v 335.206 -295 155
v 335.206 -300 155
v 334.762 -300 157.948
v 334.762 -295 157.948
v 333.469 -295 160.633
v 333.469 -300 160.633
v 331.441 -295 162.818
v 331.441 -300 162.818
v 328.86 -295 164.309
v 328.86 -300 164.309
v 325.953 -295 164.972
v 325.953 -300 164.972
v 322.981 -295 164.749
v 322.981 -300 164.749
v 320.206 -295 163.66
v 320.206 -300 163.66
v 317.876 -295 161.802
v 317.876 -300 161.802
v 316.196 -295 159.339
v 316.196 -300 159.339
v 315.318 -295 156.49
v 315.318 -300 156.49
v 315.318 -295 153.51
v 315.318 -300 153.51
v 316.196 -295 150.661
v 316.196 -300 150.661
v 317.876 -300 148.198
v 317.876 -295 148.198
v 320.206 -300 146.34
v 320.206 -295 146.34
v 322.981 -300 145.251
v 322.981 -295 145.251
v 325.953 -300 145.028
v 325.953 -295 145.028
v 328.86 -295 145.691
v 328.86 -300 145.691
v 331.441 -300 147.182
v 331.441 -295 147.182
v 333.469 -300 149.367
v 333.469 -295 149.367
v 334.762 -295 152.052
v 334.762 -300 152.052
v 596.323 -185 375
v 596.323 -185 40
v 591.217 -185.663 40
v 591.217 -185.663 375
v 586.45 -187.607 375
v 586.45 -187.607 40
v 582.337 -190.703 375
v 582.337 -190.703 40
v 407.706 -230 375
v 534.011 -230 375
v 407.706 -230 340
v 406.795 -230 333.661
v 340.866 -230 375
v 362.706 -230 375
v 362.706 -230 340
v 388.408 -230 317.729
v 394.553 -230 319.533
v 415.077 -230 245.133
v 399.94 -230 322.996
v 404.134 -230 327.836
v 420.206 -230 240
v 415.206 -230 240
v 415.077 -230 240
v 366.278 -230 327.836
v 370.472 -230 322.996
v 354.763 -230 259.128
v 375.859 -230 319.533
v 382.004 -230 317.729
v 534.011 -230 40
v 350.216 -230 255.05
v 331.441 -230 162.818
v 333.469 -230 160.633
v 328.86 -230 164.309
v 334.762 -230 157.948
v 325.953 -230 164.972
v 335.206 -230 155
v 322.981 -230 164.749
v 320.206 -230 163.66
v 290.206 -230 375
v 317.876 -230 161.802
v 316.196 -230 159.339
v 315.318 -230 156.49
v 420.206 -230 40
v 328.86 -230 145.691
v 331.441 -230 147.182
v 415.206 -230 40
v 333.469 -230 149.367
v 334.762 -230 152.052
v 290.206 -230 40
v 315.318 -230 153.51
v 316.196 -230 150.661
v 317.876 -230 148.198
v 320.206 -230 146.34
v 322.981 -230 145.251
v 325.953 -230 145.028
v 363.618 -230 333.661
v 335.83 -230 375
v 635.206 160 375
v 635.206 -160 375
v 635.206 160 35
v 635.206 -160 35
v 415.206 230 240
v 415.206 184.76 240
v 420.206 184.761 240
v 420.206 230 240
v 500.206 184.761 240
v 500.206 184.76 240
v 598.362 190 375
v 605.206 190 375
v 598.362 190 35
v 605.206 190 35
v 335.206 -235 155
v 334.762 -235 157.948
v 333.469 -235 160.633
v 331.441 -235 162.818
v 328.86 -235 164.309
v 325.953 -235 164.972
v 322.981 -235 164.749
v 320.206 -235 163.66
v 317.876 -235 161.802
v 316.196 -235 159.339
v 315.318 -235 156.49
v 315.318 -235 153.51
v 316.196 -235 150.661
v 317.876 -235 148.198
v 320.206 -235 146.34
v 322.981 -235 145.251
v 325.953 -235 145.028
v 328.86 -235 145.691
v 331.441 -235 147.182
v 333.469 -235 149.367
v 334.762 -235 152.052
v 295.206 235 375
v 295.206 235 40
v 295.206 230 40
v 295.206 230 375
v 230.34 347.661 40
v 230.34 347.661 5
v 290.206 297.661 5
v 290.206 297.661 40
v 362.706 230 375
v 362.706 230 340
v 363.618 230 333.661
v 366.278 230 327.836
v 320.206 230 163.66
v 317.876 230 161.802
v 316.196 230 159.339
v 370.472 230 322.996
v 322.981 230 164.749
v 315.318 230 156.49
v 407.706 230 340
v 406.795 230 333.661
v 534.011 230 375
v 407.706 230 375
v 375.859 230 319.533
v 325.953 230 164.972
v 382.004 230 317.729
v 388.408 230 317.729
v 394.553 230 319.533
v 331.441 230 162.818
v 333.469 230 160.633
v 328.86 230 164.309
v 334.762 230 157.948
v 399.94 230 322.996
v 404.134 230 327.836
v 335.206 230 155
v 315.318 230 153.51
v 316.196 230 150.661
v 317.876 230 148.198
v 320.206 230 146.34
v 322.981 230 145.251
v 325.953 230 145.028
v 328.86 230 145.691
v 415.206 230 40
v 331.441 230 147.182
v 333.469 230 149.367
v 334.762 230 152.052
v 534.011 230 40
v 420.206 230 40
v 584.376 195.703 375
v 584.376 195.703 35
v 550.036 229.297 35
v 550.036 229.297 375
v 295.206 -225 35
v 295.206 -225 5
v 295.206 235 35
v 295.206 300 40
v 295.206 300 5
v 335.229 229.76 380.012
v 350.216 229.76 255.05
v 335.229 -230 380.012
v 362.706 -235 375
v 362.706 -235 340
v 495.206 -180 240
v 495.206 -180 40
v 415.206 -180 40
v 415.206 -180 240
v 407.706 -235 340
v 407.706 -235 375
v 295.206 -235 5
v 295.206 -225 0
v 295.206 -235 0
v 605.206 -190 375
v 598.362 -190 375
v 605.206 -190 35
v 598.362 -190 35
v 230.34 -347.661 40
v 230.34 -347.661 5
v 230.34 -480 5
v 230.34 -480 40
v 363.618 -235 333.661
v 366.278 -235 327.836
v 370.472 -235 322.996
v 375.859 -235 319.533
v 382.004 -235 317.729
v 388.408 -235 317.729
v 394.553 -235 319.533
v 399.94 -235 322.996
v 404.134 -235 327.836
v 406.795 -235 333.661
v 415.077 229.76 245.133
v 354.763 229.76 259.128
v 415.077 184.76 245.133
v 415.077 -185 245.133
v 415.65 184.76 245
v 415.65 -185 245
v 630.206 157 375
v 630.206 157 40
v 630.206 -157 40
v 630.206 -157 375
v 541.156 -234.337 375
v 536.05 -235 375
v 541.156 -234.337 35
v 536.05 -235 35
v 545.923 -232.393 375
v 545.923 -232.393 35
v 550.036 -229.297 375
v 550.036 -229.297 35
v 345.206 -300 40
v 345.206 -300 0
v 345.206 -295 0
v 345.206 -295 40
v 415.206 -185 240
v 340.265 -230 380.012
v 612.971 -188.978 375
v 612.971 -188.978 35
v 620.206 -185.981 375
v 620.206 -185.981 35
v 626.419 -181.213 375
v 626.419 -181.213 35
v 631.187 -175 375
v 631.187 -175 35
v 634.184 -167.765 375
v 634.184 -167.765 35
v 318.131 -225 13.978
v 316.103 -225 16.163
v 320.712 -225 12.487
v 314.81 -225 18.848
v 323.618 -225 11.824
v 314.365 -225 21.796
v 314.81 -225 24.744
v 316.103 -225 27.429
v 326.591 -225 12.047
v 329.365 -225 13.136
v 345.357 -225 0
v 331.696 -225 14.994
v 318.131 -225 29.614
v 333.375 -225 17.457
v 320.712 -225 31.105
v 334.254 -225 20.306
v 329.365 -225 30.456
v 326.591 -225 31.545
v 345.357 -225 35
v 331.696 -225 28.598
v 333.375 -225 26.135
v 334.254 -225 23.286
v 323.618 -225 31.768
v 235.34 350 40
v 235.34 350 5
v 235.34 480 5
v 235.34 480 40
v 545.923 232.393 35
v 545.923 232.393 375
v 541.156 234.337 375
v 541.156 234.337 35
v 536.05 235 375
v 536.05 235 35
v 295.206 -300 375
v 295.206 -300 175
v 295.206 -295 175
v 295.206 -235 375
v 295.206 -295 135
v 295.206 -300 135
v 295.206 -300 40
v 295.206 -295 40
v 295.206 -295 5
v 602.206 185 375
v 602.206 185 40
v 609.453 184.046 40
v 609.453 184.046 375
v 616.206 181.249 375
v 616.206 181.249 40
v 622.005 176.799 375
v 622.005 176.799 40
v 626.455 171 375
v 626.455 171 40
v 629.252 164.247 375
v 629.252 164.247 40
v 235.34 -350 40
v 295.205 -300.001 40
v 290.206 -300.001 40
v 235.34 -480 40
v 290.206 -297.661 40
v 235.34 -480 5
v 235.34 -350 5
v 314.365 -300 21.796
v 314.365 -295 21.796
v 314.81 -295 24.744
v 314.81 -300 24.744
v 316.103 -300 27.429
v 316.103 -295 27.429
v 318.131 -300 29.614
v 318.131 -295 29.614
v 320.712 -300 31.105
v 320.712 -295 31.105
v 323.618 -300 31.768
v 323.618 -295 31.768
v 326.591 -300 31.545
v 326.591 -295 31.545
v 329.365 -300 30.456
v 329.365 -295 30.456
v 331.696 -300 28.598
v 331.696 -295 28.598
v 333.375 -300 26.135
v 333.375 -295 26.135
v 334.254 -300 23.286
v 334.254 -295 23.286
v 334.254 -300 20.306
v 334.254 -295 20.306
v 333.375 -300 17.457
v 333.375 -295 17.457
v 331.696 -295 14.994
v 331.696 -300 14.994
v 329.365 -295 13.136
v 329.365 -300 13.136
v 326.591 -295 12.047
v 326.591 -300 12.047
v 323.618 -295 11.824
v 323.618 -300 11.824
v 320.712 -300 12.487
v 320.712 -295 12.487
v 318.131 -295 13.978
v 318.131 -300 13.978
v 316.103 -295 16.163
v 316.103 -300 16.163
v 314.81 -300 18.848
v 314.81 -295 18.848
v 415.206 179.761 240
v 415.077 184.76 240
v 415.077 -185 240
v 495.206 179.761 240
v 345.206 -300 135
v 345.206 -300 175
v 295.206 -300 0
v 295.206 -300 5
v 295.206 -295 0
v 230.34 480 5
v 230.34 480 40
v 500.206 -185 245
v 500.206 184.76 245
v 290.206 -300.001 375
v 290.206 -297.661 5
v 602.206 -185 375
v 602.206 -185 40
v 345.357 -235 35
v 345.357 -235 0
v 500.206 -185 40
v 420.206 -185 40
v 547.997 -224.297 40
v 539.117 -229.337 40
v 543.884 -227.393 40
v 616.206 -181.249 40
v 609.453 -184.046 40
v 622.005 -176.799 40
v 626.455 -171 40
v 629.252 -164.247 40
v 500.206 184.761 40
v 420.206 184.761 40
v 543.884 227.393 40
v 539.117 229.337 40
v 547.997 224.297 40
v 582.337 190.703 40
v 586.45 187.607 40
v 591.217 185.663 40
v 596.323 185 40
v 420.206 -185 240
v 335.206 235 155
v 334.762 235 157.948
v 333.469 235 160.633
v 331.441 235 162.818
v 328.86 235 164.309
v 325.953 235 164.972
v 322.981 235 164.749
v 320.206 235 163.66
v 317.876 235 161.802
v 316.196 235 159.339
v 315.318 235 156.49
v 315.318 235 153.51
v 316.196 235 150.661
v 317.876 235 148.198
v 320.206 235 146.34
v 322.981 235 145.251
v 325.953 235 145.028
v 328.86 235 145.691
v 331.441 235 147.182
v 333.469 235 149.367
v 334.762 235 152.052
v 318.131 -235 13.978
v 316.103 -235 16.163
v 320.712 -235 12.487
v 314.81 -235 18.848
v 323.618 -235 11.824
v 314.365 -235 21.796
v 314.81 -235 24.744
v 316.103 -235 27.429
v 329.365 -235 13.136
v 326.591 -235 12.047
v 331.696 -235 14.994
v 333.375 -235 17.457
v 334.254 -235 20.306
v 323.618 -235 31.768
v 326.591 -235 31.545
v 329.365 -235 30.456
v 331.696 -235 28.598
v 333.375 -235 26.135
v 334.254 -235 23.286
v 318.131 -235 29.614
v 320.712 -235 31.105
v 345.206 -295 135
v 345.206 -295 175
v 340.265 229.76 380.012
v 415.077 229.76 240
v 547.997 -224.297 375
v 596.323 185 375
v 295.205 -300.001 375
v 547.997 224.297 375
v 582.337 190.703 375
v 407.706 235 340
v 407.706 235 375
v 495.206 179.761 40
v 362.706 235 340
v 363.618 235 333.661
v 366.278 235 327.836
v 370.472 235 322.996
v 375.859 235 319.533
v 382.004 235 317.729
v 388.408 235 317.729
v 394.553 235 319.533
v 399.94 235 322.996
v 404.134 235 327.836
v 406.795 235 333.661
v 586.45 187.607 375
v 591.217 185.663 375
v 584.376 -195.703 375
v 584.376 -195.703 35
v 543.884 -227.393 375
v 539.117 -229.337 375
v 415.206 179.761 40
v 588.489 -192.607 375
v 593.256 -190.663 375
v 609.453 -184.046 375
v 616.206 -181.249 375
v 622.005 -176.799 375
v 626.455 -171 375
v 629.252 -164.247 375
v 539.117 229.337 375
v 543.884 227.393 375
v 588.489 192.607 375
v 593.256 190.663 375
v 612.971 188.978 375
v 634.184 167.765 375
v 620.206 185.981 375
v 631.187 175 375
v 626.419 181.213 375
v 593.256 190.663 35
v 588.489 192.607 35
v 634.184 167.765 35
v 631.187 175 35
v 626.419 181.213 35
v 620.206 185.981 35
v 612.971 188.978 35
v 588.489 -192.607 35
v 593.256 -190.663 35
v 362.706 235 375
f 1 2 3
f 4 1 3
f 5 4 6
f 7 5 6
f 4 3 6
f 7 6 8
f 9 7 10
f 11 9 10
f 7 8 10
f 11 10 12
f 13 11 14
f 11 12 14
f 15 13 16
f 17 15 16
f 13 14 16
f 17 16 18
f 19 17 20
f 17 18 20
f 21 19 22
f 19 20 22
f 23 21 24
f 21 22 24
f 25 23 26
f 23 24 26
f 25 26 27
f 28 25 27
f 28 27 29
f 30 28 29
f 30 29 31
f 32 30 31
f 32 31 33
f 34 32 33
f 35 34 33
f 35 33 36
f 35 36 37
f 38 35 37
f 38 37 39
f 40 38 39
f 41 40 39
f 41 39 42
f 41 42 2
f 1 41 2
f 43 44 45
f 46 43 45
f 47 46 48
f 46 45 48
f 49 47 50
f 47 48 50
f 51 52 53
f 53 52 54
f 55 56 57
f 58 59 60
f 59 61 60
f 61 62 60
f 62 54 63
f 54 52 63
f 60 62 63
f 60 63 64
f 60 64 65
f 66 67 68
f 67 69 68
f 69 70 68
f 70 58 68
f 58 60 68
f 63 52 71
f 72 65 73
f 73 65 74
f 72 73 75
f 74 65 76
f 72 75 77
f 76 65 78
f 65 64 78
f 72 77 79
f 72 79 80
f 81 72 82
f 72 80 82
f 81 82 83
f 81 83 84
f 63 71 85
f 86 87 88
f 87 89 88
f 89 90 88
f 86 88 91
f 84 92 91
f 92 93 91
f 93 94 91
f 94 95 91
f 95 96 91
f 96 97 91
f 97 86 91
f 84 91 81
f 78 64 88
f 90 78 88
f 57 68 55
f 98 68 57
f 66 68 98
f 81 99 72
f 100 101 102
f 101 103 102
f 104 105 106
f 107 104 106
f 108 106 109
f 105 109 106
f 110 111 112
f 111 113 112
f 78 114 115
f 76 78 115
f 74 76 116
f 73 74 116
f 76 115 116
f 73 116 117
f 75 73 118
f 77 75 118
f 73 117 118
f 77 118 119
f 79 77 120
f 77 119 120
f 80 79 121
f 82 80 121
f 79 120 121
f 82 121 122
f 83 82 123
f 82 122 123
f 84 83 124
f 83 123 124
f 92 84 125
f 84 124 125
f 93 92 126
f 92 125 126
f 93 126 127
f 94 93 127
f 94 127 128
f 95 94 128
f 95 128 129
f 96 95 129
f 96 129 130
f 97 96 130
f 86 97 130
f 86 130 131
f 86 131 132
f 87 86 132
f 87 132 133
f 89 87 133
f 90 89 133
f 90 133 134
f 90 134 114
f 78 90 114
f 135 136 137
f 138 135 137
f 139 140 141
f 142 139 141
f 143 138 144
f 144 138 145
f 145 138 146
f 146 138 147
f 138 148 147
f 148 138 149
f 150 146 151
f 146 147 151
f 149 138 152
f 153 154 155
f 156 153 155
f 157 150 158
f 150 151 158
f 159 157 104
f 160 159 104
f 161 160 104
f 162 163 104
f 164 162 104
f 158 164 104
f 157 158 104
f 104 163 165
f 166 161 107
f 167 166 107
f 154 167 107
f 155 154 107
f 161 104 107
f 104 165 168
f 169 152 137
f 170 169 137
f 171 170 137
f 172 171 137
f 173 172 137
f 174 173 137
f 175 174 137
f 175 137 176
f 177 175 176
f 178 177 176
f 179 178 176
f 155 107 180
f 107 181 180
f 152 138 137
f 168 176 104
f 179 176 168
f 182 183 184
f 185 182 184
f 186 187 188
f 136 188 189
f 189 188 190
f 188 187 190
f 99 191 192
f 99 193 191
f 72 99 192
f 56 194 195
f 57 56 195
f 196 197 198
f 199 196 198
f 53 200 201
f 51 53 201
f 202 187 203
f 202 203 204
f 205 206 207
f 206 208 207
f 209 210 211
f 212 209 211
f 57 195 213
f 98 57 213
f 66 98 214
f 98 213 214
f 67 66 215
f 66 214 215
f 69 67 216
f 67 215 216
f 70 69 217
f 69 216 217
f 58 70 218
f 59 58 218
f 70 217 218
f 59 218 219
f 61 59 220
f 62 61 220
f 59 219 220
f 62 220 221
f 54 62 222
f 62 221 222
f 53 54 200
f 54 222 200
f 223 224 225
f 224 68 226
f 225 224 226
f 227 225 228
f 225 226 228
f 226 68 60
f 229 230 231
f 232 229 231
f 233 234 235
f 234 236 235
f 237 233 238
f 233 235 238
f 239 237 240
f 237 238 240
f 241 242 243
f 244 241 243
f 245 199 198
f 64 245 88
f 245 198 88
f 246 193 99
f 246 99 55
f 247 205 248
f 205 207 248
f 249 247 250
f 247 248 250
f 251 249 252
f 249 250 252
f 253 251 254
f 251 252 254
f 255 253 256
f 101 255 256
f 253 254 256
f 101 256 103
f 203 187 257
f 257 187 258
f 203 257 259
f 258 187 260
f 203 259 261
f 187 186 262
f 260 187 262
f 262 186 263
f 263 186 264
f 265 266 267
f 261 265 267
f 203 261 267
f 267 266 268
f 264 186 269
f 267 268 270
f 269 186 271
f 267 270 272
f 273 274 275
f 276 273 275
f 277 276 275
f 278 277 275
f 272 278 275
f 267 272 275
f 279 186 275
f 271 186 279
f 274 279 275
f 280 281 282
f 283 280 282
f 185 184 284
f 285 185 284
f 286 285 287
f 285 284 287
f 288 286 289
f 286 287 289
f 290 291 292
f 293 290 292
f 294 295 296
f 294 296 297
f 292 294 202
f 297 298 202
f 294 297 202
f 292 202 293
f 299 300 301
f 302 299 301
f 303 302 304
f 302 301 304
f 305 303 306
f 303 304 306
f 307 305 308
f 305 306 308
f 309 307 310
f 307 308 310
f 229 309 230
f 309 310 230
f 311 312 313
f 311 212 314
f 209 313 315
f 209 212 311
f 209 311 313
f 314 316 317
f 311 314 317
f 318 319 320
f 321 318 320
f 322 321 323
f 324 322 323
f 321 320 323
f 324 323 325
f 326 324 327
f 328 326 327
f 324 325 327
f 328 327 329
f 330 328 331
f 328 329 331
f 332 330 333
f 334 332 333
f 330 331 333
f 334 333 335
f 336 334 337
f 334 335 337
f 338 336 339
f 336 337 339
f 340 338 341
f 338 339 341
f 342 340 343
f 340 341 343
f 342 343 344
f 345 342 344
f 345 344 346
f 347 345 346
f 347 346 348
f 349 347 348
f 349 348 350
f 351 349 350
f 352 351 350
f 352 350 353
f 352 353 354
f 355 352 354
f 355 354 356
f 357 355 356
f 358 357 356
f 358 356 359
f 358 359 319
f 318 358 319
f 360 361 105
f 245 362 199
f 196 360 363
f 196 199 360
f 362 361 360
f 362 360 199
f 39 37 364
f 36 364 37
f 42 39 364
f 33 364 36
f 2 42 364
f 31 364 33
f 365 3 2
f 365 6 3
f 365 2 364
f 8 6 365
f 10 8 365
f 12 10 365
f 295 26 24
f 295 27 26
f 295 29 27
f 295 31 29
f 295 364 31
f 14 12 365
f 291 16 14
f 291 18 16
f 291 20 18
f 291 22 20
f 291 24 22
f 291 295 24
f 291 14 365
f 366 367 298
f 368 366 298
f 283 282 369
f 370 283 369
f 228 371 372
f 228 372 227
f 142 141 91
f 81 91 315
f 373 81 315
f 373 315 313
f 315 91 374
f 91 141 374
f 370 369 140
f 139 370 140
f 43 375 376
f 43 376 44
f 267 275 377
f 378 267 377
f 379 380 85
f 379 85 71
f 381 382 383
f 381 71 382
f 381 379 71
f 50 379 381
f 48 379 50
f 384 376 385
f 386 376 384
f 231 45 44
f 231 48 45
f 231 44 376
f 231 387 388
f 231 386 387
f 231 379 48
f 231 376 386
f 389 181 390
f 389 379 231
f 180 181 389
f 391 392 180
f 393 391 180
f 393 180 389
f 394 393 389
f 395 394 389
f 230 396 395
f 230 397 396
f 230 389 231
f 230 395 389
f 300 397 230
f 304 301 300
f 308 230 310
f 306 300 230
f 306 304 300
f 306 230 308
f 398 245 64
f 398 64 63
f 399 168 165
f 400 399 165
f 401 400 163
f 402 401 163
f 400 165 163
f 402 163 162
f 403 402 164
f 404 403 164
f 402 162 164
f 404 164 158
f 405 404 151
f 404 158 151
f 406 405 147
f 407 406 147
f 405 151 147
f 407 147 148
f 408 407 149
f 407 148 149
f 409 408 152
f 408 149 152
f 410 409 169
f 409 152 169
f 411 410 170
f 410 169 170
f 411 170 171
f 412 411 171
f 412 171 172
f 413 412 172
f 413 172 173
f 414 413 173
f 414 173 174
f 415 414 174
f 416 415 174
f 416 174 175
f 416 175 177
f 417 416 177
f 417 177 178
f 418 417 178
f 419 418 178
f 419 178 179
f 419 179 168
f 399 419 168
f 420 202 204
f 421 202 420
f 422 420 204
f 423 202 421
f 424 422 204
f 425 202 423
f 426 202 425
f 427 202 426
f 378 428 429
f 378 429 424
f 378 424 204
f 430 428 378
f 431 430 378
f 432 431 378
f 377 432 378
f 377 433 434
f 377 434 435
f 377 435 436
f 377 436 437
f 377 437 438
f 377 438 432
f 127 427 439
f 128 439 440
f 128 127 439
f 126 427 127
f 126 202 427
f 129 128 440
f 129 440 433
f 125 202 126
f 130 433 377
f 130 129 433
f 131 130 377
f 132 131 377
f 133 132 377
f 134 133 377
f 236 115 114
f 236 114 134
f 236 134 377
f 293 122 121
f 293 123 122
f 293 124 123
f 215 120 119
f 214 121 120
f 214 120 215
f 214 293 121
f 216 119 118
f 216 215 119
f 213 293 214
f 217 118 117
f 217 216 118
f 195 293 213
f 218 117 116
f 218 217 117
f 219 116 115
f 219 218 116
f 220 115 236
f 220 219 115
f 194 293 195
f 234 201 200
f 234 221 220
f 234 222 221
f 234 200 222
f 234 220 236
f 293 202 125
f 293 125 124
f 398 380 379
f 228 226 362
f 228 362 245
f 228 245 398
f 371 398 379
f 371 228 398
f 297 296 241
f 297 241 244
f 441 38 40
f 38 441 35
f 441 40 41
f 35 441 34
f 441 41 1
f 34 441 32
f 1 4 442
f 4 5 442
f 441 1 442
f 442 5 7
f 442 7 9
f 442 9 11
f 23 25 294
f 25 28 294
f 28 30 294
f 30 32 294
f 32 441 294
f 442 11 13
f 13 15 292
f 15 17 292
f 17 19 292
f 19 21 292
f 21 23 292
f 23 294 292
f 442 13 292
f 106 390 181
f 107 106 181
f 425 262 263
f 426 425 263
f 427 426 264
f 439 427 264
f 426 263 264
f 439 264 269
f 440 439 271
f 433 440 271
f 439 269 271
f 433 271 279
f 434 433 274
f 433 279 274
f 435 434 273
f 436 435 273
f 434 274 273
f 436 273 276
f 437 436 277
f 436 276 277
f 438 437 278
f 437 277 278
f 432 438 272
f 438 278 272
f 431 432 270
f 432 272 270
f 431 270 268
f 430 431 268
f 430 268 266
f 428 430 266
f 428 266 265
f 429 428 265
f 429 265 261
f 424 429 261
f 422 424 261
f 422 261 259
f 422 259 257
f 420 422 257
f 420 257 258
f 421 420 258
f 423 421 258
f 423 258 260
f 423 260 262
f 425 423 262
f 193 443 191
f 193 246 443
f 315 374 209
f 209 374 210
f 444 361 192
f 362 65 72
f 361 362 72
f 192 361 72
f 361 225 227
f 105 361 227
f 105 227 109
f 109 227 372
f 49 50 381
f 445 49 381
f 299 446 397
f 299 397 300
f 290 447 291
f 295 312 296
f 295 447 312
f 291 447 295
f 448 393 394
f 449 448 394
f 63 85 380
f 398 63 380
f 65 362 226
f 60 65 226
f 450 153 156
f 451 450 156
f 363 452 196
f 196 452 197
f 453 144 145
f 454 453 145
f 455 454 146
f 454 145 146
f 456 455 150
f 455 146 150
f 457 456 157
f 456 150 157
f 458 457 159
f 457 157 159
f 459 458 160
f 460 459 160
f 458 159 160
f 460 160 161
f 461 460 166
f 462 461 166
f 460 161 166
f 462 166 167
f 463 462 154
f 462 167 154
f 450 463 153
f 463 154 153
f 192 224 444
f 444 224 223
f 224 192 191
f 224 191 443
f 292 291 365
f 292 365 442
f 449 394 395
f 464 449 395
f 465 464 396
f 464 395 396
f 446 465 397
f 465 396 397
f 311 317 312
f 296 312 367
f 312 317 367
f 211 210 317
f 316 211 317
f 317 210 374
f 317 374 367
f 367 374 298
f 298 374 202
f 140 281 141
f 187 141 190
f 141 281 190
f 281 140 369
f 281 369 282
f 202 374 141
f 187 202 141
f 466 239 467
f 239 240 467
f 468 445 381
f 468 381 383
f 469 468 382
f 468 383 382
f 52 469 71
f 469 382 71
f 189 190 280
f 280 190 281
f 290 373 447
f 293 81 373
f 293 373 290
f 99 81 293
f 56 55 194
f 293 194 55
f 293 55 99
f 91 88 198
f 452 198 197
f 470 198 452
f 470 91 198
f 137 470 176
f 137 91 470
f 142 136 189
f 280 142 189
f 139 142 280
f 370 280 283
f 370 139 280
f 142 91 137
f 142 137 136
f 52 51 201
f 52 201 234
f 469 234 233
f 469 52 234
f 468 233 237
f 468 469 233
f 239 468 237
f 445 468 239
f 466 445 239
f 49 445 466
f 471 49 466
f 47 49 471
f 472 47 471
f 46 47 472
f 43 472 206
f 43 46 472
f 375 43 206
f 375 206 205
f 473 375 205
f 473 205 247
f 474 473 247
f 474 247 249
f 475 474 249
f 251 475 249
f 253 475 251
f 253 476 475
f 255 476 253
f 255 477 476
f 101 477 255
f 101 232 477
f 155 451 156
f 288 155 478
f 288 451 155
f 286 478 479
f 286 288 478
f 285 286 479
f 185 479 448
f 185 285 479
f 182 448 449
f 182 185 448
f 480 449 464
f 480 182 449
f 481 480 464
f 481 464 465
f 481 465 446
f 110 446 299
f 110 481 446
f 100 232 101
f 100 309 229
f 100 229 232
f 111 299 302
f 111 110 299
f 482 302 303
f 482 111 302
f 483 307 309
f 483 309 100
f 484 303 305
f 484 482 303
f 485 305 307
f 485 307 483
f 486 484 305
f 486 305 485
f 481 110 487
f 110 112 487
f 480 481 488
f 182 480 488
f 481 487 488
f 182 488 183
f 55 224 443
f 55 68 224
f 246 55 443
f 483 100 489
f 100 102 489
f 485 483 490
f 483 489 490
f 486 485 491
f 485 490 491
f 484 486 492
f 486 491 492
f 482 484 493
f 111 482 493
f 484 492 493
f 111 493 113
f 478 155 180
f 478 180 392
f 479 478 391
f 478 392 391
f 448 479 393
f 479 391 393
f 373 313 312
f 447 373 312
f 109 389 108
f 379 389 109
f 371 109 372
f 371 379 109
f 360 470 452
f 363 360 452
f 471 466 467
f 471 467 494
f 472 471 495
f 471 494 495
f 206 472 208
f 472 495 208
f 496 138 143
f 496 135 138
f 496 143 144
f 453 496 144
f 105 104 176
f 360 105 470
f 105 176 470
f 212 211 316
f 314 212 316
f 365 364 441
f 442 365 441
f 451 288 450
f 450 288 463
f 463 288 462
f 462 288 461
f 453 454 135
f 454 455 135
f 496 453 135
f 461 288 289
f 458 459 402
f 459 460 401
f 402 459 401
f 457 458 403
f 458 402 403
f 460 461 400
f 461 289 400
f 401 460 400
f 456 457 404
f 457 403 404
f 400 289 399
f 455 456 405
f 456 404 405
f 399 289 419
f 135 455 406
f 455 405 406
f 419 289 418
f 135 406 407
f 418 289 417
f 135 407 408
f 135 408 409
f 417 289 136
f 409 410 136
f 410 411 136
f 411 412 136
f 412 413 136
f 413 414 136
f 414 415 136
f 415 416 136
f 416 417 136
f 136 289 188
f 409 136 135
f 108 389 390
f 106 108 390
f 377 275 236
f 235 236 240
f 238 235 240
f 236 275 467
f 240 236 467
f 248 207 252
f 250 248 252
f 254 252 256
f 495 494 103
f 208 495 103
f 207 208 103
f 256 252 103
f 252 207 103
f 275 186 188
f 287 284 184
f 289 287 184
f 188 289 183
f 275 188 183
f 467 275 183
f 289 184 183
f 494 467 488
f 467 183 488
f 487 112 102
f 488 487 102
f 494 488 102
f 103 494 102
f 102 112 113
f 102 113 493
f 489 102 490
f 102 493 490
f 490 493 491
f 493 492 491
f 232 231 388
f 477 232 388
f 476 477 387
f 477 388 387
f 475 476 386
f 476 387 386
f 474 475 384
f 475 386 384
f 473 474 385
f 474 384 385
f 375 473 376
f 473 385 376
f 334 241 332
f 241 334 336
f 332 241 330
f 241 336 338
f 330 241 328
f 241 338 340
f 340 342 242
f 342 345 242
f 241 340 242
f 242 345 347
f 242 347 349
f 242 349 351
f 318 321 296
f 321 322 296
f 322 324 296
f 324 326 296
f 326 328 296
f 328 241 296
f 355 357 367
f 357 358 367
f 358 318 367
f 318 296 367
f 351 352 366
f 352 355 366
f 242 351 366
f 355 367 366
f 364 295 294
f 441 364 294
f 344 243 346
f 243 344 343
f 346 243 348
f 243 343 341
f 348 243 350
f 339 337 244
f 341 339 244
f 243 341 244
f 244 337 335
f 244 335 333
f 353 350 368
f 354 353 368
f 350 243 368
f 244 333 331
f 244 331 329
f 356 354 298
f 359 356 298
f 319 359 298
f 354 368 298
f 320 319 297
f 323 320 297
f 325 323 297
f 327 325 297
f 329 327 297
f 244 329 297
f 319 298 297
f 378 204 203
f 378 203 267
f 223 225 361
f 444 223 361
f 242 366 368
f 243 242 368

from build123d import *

# Parameters (mm, degrees)
F7_START  = 35
F7_DEPTH  = 5
F8_START  = 5
F8_DEPTH  = 35
F11_DEPTH = 200
F13_DEPTH = 369.76
F15_DEPTH = 45
F17_DEPTH = 45
F18_DEPTH = 45
F19_DEPTH = 45
F20_DEPTH = 335
F22_W     = 50.1510878829
F22_H     = 10
F23_DEPTH = 35
F24_W     = 5
F24_H     = 35
F24_H_2   = 5
F25_DEPTH = 50
F26_R     = 10
F27_DEPTH = 255.001
F29_DEPTH = 335
F30_W     = 5
F30_H     = 40
F31_DEPTH = 50
F32_R     = 10
F33_DEPTH = 780.001
F35_DEPTH = 715.001


with BuildPart() as f7:
    # F5 (on face) → F7 (new body)
    with BuildSketch(Plane.XY.offset(F7_START)):
        with BuildLine():
            Line((536.0502983732, 235), (295.2061215611, 235))
            Line((295.2061215611, 235), (295.2061215611, -235))
            Line((295.2061215611, -235), (536.0502983732, -235))
            ThreePointArc((536.0502983732, -235), (543.6023308733, -233.5193629782), (550.0361814825, -229.2966805117))
            Line((550.0361814825, -229.2966805117), (584.3760616397, -195.7033194883))
            ThreePointArc((584.3760616397, -195.7033194883), (590.8099122489, -191.4806370218), (598.361944749, -190))
            Line((598.361944749, -190), (605.2061215611, -190))
            ThreePointArc((605.2061215611, -190), (626.4193249967, -181.2132034356), (635.2061215611, -160))
            Line((635.2061215611, -160), (635.2061215611, 160))
            ThreePointArc((635.2061215611, 160), (626.4193249967, 181.2132034356), (605.2061215611, 190))
            Line((605.2061215611, 190), (598.361944749, 190))
            ThreePointArc((598.361944749, 190), (590.8099122489, 191.4806370218), (584.3760616397, 195.7033194883))
            Line((584.3760616397, 195.7033194883), (550.0361814825, 229.2966805117))
            ThreePointArc((550.0361814825, 229.2966805117), (543.6023308733, 233.5193629782), (536.0502983732, 235))
        make_face()
    extrude(amount=F7_DEPTH)

    # F10 (on face) → F11 (join)
    with BuildSketch(Plane.XY.offset(40)):
        Polygon((420.2061215611, 230), (415.2061215611, 230), (415.2061215611, 179.7606539726), (495.2061215611, 179.7606539726), (495.2061215611, -180), (415.2061215611, -180), (415.2061215611, -230), (420.2061215611, -230), (420.2061215611, -185), (500.2061215611, -185), (500.2061215611, 184.7606539726), (420.2061215611, 184.7606539726), align=None)
    extrude(amount=F11_DEPTH)



with BuildPart() as f8:
    # F6 (on face) → F8 (new body)
    with BuildSketch(Plane.XY.offset(F8_START)):
        Polygon((235.3396033727, 350), (235.3396033727, 480), (230.3396033727, 480), (230.3396033727, 347.6614641333), (290.2061215611, 297.6614641333), (290.2061215611, -297.6614641333), (230.3396033727, -347.6614641333), (230.3396033727, -480), (235.3396033727, -480), (235.3396033727, -350), (295.2061215611, -300), (295.2061215611, 300), align=None)
    extrude(amount=F8_DEPTH)


with BuildPart() as f13:
    # F12 (on face) → F13 (new body)
    with BuildSketch(Plane.XZ.offset(185)):
        Polygon((415.077149868, 240), (500.2061215611, 240), (500.2061215611, 245), (415.6496353582, 245), (354.7629135856, 259.1279170394), (340.264830222, 380.0120656257), (335.2289983824, 380.0120656257), (350.2161502838, 255.0500929356), align=None)
    extrude(amount=-F13_DEPTH)

    # F14 (on face) → F15 (join)
    with BuildSketch(Plane.XZ.offset(185)):
        Polygon((354.7629135856, 259.1279170394), (350.2161502838, 255.0500929356), (415.077149868, 240), (415.077149868, 245.1328372965), align=None)
    extrude(amount=F15_DEPTH)

    # F16 (on face) → F17 (join)
    with BuildSketch(Plane(origin=(0, 184.76, 0), x_dir=(-1, 0, 0), z_dir=(0, 1, 0))):
        Polygon((-415.077149868, 245.1328372965), (-415.077149868, 240), (-350.2161502838, 255.0500929356), (-354.7629135856, 259.1279170394), align=None)
    extrude(amount=F17_DEPTH)

    # F18 (add): a face of the model
    f18_faces = [f13.faces().sort_by_distance(p)[0] for p in [
        (345.1049776592, -185, 318.5448987695),
    ]]
    extrude(f18_faces, amount=F18_DEPTH)

    # F19 (add): a face of the model
    f19_faces = [f13.faces().sort_by_distance(p)[0] for p in [
        (345.1049776592, 184.76, 318.5448987695),
    ]]
    extrude(f19_faces, amount=F19_DEPTH)


with BuildPart() as f7_1:
    add(f7.part)

    add(f8.part)  # F20 merges F8

    add(f13.part)  # F20 merges F13
    # F9 (on face) → F20 (join)
    with BuildSketch(Plane.XY.offset(40)):
        with BuildLine():
            Line((536.0502983732, 235), (295.2061215611, 235))
            Line((295.2061215611, 235), (295.2061215611, 230))
            Line((295.2061215611, 230), (534.0113425762, 230))
            ThreePointArc((534.0113425762, 230), (541.5633750764, 228.5193629782), (547.9972256855, 224.2966805117))
            Line((547.9972256855, 224.2966805117), (582.3371058428, 190.7033194883))
            ThreePointArc((582.3371058428, 190.7033194883), (588.7709564519, 186.4806370218), (596.322988952, 185))
            Line((596.322988952, 185), (602.2061215611, 185))
            ThreePointArc((602.2061215611, 185), (622.0051114343, 176.7989898732), (630.2061215611, 157))
            Line((630.2061215611, 157), (630.2061215611, -157))
            ThreePointArc((630.2061215611, -157), (622.0051114343, -176.7989898732), (602.2061215611, -185))
            Line((602.2061215611, -185), (596.322988952, -185))
            ThreePointArc((596.322988952, -185), (588.7709564519, -186.4806370218), (582.3371058428, -190.7033194883))
            Line((582.3371058428, -190.7033194883), (547.9972256855, -224.2966805117))
            ThreePointArc((547.9972256855, -224.2966805117), (541.5633750764, -228.5193629782), (534.0113425762, -230))
            Line((534.0113425762, -230), (295.2061215611, -230))
            Line((295.2061215611, -230), (295.2061215611, -235))
            Line((295.2061215611, -235), (536.0502983732, -235))
            ThreePointArc((536.0502983732, -235), (543.6023308733, -233.5193629782), (550.0361814825, -229.2966805117))
            Line((550.0361814825, -229.2966805117), (584.3760616397, -195.7033194883))
            ThreePointArc((584.3760616397, -195.7033194883), (590.8099122489, -191.4806370218), (598.361944749, -190))
            Line((598.361944749, -190), (605.2061215611, -190))
            ThreePointArc((605.2061215611, -190), (626.4193249967, -181.2132034356), (635.2061215611, -160))
            Line((635.2061215611, -160), (635.2061215611, 160))
            ThreePointArc((635.2061215611, 160), (626.4193249967, 181.2132034356), (605.2061215611, 190))
            Line((605.2061215611, 190), (598.361944749, 190))
            ThreePointArc((598.361944749, 190), (590.8099122489, 191.4806370218), (584.3760616397, 195.7033194883))
            Line((584.3760616397, 195.7033194883), (550.0361814825, 229.2966805117))
            ThreePointArc((550.0361814825, 229.2966805117), (543.6023308733, 233.5193629782), (536.0502983732, 235))
        make_face()
    extrude(amount=F20_DEPTH)

    # F22 (on face) → F23 (join)
    with BuildSketch(Plane(origin=(0, 0, 35), x_dir=(1, 0, 0), z_dir=(0, 0, -1))):
        with Locations((320.2816655026, 230)):
            Rectangle(F22_W, F22_H)
    extrude(amount=F23_DEPTH)

    # F24 (on face) → F25 (join)
    with BuildSketch(Plane.YZ.offset(295.2061215611)):
        with Locations((-297.5, 22.5)):
            Rectangle(F24_W, F24_H)
        with Locations((-297.5, 2.5)):
            Rectangle(F24_W, F24_H_2)
    extrude(amount=F25_DEPTH)

    # F26 (on face) → F27 (cut, through all)
    with BuildSketch(Plane(origin=(0, -225, 0), x_dir=(-1, 0, 0), z_dir=(0, 1, 0))):
        with Locations((-324.3654668331, 21.796002984)):
            Circle(F26_R)
    extrude(amount=-F27_DEPTH, mode=Mode.SUBTRACT)

    # F28 (on face) → F29 (join)
    with BuildSketch(Plane.XY.offset(40)):
        Polygon((295.2061215611, -235), (295.2061215611, -230), (290.2061215611, -230), (290.2061215611, -297.6614641333), (290.2061215611, -300.0012075878), (295.2046756796, -300.0012075878), (295.2061215611, -300), (295.2061215611, -295), align=None)
    extrude(amount=F29_DEPTH)

    # F30 (on face) → F31 (join)
    with BuildSketch(Plane.YZ.offset(295.2061215611)):
        with Locations((-297.5, 155)):
            Rectangle(F30_W, F30_H)
    extrude(amount=F31_DEPTH)

    # F32 (on face) → F33 (cut, through all)
    with BuildSketch(Plane.XZ.offset(300)):
        with Locations((325.2061215611, 155)):
            Circle(F32_R)
    extrude(amount=-F33_DEPTH, mode=Mode.SUBTRACT)

    # F34 (on face) → F35 (cut, through all)
    with BuildSketch(Plane.XZ.offset(235)):
        with BuildLine():
            Line((362.7061215611, 375), (362.7061215611, 340))
            ThreePointArc((362.7061215611, 340), (385.2061215611, 317.5), (407.7061215611, 340))
            Line((407.7061215611, 340), (407.7061215611, 375))
            Line((407.7061215611, 375), (362.7061215611, 375))
        make_face()
    extrude(amount=-F35_DEPTH, mode=Mode.SUBTRACT)


solid = f7_1.part
